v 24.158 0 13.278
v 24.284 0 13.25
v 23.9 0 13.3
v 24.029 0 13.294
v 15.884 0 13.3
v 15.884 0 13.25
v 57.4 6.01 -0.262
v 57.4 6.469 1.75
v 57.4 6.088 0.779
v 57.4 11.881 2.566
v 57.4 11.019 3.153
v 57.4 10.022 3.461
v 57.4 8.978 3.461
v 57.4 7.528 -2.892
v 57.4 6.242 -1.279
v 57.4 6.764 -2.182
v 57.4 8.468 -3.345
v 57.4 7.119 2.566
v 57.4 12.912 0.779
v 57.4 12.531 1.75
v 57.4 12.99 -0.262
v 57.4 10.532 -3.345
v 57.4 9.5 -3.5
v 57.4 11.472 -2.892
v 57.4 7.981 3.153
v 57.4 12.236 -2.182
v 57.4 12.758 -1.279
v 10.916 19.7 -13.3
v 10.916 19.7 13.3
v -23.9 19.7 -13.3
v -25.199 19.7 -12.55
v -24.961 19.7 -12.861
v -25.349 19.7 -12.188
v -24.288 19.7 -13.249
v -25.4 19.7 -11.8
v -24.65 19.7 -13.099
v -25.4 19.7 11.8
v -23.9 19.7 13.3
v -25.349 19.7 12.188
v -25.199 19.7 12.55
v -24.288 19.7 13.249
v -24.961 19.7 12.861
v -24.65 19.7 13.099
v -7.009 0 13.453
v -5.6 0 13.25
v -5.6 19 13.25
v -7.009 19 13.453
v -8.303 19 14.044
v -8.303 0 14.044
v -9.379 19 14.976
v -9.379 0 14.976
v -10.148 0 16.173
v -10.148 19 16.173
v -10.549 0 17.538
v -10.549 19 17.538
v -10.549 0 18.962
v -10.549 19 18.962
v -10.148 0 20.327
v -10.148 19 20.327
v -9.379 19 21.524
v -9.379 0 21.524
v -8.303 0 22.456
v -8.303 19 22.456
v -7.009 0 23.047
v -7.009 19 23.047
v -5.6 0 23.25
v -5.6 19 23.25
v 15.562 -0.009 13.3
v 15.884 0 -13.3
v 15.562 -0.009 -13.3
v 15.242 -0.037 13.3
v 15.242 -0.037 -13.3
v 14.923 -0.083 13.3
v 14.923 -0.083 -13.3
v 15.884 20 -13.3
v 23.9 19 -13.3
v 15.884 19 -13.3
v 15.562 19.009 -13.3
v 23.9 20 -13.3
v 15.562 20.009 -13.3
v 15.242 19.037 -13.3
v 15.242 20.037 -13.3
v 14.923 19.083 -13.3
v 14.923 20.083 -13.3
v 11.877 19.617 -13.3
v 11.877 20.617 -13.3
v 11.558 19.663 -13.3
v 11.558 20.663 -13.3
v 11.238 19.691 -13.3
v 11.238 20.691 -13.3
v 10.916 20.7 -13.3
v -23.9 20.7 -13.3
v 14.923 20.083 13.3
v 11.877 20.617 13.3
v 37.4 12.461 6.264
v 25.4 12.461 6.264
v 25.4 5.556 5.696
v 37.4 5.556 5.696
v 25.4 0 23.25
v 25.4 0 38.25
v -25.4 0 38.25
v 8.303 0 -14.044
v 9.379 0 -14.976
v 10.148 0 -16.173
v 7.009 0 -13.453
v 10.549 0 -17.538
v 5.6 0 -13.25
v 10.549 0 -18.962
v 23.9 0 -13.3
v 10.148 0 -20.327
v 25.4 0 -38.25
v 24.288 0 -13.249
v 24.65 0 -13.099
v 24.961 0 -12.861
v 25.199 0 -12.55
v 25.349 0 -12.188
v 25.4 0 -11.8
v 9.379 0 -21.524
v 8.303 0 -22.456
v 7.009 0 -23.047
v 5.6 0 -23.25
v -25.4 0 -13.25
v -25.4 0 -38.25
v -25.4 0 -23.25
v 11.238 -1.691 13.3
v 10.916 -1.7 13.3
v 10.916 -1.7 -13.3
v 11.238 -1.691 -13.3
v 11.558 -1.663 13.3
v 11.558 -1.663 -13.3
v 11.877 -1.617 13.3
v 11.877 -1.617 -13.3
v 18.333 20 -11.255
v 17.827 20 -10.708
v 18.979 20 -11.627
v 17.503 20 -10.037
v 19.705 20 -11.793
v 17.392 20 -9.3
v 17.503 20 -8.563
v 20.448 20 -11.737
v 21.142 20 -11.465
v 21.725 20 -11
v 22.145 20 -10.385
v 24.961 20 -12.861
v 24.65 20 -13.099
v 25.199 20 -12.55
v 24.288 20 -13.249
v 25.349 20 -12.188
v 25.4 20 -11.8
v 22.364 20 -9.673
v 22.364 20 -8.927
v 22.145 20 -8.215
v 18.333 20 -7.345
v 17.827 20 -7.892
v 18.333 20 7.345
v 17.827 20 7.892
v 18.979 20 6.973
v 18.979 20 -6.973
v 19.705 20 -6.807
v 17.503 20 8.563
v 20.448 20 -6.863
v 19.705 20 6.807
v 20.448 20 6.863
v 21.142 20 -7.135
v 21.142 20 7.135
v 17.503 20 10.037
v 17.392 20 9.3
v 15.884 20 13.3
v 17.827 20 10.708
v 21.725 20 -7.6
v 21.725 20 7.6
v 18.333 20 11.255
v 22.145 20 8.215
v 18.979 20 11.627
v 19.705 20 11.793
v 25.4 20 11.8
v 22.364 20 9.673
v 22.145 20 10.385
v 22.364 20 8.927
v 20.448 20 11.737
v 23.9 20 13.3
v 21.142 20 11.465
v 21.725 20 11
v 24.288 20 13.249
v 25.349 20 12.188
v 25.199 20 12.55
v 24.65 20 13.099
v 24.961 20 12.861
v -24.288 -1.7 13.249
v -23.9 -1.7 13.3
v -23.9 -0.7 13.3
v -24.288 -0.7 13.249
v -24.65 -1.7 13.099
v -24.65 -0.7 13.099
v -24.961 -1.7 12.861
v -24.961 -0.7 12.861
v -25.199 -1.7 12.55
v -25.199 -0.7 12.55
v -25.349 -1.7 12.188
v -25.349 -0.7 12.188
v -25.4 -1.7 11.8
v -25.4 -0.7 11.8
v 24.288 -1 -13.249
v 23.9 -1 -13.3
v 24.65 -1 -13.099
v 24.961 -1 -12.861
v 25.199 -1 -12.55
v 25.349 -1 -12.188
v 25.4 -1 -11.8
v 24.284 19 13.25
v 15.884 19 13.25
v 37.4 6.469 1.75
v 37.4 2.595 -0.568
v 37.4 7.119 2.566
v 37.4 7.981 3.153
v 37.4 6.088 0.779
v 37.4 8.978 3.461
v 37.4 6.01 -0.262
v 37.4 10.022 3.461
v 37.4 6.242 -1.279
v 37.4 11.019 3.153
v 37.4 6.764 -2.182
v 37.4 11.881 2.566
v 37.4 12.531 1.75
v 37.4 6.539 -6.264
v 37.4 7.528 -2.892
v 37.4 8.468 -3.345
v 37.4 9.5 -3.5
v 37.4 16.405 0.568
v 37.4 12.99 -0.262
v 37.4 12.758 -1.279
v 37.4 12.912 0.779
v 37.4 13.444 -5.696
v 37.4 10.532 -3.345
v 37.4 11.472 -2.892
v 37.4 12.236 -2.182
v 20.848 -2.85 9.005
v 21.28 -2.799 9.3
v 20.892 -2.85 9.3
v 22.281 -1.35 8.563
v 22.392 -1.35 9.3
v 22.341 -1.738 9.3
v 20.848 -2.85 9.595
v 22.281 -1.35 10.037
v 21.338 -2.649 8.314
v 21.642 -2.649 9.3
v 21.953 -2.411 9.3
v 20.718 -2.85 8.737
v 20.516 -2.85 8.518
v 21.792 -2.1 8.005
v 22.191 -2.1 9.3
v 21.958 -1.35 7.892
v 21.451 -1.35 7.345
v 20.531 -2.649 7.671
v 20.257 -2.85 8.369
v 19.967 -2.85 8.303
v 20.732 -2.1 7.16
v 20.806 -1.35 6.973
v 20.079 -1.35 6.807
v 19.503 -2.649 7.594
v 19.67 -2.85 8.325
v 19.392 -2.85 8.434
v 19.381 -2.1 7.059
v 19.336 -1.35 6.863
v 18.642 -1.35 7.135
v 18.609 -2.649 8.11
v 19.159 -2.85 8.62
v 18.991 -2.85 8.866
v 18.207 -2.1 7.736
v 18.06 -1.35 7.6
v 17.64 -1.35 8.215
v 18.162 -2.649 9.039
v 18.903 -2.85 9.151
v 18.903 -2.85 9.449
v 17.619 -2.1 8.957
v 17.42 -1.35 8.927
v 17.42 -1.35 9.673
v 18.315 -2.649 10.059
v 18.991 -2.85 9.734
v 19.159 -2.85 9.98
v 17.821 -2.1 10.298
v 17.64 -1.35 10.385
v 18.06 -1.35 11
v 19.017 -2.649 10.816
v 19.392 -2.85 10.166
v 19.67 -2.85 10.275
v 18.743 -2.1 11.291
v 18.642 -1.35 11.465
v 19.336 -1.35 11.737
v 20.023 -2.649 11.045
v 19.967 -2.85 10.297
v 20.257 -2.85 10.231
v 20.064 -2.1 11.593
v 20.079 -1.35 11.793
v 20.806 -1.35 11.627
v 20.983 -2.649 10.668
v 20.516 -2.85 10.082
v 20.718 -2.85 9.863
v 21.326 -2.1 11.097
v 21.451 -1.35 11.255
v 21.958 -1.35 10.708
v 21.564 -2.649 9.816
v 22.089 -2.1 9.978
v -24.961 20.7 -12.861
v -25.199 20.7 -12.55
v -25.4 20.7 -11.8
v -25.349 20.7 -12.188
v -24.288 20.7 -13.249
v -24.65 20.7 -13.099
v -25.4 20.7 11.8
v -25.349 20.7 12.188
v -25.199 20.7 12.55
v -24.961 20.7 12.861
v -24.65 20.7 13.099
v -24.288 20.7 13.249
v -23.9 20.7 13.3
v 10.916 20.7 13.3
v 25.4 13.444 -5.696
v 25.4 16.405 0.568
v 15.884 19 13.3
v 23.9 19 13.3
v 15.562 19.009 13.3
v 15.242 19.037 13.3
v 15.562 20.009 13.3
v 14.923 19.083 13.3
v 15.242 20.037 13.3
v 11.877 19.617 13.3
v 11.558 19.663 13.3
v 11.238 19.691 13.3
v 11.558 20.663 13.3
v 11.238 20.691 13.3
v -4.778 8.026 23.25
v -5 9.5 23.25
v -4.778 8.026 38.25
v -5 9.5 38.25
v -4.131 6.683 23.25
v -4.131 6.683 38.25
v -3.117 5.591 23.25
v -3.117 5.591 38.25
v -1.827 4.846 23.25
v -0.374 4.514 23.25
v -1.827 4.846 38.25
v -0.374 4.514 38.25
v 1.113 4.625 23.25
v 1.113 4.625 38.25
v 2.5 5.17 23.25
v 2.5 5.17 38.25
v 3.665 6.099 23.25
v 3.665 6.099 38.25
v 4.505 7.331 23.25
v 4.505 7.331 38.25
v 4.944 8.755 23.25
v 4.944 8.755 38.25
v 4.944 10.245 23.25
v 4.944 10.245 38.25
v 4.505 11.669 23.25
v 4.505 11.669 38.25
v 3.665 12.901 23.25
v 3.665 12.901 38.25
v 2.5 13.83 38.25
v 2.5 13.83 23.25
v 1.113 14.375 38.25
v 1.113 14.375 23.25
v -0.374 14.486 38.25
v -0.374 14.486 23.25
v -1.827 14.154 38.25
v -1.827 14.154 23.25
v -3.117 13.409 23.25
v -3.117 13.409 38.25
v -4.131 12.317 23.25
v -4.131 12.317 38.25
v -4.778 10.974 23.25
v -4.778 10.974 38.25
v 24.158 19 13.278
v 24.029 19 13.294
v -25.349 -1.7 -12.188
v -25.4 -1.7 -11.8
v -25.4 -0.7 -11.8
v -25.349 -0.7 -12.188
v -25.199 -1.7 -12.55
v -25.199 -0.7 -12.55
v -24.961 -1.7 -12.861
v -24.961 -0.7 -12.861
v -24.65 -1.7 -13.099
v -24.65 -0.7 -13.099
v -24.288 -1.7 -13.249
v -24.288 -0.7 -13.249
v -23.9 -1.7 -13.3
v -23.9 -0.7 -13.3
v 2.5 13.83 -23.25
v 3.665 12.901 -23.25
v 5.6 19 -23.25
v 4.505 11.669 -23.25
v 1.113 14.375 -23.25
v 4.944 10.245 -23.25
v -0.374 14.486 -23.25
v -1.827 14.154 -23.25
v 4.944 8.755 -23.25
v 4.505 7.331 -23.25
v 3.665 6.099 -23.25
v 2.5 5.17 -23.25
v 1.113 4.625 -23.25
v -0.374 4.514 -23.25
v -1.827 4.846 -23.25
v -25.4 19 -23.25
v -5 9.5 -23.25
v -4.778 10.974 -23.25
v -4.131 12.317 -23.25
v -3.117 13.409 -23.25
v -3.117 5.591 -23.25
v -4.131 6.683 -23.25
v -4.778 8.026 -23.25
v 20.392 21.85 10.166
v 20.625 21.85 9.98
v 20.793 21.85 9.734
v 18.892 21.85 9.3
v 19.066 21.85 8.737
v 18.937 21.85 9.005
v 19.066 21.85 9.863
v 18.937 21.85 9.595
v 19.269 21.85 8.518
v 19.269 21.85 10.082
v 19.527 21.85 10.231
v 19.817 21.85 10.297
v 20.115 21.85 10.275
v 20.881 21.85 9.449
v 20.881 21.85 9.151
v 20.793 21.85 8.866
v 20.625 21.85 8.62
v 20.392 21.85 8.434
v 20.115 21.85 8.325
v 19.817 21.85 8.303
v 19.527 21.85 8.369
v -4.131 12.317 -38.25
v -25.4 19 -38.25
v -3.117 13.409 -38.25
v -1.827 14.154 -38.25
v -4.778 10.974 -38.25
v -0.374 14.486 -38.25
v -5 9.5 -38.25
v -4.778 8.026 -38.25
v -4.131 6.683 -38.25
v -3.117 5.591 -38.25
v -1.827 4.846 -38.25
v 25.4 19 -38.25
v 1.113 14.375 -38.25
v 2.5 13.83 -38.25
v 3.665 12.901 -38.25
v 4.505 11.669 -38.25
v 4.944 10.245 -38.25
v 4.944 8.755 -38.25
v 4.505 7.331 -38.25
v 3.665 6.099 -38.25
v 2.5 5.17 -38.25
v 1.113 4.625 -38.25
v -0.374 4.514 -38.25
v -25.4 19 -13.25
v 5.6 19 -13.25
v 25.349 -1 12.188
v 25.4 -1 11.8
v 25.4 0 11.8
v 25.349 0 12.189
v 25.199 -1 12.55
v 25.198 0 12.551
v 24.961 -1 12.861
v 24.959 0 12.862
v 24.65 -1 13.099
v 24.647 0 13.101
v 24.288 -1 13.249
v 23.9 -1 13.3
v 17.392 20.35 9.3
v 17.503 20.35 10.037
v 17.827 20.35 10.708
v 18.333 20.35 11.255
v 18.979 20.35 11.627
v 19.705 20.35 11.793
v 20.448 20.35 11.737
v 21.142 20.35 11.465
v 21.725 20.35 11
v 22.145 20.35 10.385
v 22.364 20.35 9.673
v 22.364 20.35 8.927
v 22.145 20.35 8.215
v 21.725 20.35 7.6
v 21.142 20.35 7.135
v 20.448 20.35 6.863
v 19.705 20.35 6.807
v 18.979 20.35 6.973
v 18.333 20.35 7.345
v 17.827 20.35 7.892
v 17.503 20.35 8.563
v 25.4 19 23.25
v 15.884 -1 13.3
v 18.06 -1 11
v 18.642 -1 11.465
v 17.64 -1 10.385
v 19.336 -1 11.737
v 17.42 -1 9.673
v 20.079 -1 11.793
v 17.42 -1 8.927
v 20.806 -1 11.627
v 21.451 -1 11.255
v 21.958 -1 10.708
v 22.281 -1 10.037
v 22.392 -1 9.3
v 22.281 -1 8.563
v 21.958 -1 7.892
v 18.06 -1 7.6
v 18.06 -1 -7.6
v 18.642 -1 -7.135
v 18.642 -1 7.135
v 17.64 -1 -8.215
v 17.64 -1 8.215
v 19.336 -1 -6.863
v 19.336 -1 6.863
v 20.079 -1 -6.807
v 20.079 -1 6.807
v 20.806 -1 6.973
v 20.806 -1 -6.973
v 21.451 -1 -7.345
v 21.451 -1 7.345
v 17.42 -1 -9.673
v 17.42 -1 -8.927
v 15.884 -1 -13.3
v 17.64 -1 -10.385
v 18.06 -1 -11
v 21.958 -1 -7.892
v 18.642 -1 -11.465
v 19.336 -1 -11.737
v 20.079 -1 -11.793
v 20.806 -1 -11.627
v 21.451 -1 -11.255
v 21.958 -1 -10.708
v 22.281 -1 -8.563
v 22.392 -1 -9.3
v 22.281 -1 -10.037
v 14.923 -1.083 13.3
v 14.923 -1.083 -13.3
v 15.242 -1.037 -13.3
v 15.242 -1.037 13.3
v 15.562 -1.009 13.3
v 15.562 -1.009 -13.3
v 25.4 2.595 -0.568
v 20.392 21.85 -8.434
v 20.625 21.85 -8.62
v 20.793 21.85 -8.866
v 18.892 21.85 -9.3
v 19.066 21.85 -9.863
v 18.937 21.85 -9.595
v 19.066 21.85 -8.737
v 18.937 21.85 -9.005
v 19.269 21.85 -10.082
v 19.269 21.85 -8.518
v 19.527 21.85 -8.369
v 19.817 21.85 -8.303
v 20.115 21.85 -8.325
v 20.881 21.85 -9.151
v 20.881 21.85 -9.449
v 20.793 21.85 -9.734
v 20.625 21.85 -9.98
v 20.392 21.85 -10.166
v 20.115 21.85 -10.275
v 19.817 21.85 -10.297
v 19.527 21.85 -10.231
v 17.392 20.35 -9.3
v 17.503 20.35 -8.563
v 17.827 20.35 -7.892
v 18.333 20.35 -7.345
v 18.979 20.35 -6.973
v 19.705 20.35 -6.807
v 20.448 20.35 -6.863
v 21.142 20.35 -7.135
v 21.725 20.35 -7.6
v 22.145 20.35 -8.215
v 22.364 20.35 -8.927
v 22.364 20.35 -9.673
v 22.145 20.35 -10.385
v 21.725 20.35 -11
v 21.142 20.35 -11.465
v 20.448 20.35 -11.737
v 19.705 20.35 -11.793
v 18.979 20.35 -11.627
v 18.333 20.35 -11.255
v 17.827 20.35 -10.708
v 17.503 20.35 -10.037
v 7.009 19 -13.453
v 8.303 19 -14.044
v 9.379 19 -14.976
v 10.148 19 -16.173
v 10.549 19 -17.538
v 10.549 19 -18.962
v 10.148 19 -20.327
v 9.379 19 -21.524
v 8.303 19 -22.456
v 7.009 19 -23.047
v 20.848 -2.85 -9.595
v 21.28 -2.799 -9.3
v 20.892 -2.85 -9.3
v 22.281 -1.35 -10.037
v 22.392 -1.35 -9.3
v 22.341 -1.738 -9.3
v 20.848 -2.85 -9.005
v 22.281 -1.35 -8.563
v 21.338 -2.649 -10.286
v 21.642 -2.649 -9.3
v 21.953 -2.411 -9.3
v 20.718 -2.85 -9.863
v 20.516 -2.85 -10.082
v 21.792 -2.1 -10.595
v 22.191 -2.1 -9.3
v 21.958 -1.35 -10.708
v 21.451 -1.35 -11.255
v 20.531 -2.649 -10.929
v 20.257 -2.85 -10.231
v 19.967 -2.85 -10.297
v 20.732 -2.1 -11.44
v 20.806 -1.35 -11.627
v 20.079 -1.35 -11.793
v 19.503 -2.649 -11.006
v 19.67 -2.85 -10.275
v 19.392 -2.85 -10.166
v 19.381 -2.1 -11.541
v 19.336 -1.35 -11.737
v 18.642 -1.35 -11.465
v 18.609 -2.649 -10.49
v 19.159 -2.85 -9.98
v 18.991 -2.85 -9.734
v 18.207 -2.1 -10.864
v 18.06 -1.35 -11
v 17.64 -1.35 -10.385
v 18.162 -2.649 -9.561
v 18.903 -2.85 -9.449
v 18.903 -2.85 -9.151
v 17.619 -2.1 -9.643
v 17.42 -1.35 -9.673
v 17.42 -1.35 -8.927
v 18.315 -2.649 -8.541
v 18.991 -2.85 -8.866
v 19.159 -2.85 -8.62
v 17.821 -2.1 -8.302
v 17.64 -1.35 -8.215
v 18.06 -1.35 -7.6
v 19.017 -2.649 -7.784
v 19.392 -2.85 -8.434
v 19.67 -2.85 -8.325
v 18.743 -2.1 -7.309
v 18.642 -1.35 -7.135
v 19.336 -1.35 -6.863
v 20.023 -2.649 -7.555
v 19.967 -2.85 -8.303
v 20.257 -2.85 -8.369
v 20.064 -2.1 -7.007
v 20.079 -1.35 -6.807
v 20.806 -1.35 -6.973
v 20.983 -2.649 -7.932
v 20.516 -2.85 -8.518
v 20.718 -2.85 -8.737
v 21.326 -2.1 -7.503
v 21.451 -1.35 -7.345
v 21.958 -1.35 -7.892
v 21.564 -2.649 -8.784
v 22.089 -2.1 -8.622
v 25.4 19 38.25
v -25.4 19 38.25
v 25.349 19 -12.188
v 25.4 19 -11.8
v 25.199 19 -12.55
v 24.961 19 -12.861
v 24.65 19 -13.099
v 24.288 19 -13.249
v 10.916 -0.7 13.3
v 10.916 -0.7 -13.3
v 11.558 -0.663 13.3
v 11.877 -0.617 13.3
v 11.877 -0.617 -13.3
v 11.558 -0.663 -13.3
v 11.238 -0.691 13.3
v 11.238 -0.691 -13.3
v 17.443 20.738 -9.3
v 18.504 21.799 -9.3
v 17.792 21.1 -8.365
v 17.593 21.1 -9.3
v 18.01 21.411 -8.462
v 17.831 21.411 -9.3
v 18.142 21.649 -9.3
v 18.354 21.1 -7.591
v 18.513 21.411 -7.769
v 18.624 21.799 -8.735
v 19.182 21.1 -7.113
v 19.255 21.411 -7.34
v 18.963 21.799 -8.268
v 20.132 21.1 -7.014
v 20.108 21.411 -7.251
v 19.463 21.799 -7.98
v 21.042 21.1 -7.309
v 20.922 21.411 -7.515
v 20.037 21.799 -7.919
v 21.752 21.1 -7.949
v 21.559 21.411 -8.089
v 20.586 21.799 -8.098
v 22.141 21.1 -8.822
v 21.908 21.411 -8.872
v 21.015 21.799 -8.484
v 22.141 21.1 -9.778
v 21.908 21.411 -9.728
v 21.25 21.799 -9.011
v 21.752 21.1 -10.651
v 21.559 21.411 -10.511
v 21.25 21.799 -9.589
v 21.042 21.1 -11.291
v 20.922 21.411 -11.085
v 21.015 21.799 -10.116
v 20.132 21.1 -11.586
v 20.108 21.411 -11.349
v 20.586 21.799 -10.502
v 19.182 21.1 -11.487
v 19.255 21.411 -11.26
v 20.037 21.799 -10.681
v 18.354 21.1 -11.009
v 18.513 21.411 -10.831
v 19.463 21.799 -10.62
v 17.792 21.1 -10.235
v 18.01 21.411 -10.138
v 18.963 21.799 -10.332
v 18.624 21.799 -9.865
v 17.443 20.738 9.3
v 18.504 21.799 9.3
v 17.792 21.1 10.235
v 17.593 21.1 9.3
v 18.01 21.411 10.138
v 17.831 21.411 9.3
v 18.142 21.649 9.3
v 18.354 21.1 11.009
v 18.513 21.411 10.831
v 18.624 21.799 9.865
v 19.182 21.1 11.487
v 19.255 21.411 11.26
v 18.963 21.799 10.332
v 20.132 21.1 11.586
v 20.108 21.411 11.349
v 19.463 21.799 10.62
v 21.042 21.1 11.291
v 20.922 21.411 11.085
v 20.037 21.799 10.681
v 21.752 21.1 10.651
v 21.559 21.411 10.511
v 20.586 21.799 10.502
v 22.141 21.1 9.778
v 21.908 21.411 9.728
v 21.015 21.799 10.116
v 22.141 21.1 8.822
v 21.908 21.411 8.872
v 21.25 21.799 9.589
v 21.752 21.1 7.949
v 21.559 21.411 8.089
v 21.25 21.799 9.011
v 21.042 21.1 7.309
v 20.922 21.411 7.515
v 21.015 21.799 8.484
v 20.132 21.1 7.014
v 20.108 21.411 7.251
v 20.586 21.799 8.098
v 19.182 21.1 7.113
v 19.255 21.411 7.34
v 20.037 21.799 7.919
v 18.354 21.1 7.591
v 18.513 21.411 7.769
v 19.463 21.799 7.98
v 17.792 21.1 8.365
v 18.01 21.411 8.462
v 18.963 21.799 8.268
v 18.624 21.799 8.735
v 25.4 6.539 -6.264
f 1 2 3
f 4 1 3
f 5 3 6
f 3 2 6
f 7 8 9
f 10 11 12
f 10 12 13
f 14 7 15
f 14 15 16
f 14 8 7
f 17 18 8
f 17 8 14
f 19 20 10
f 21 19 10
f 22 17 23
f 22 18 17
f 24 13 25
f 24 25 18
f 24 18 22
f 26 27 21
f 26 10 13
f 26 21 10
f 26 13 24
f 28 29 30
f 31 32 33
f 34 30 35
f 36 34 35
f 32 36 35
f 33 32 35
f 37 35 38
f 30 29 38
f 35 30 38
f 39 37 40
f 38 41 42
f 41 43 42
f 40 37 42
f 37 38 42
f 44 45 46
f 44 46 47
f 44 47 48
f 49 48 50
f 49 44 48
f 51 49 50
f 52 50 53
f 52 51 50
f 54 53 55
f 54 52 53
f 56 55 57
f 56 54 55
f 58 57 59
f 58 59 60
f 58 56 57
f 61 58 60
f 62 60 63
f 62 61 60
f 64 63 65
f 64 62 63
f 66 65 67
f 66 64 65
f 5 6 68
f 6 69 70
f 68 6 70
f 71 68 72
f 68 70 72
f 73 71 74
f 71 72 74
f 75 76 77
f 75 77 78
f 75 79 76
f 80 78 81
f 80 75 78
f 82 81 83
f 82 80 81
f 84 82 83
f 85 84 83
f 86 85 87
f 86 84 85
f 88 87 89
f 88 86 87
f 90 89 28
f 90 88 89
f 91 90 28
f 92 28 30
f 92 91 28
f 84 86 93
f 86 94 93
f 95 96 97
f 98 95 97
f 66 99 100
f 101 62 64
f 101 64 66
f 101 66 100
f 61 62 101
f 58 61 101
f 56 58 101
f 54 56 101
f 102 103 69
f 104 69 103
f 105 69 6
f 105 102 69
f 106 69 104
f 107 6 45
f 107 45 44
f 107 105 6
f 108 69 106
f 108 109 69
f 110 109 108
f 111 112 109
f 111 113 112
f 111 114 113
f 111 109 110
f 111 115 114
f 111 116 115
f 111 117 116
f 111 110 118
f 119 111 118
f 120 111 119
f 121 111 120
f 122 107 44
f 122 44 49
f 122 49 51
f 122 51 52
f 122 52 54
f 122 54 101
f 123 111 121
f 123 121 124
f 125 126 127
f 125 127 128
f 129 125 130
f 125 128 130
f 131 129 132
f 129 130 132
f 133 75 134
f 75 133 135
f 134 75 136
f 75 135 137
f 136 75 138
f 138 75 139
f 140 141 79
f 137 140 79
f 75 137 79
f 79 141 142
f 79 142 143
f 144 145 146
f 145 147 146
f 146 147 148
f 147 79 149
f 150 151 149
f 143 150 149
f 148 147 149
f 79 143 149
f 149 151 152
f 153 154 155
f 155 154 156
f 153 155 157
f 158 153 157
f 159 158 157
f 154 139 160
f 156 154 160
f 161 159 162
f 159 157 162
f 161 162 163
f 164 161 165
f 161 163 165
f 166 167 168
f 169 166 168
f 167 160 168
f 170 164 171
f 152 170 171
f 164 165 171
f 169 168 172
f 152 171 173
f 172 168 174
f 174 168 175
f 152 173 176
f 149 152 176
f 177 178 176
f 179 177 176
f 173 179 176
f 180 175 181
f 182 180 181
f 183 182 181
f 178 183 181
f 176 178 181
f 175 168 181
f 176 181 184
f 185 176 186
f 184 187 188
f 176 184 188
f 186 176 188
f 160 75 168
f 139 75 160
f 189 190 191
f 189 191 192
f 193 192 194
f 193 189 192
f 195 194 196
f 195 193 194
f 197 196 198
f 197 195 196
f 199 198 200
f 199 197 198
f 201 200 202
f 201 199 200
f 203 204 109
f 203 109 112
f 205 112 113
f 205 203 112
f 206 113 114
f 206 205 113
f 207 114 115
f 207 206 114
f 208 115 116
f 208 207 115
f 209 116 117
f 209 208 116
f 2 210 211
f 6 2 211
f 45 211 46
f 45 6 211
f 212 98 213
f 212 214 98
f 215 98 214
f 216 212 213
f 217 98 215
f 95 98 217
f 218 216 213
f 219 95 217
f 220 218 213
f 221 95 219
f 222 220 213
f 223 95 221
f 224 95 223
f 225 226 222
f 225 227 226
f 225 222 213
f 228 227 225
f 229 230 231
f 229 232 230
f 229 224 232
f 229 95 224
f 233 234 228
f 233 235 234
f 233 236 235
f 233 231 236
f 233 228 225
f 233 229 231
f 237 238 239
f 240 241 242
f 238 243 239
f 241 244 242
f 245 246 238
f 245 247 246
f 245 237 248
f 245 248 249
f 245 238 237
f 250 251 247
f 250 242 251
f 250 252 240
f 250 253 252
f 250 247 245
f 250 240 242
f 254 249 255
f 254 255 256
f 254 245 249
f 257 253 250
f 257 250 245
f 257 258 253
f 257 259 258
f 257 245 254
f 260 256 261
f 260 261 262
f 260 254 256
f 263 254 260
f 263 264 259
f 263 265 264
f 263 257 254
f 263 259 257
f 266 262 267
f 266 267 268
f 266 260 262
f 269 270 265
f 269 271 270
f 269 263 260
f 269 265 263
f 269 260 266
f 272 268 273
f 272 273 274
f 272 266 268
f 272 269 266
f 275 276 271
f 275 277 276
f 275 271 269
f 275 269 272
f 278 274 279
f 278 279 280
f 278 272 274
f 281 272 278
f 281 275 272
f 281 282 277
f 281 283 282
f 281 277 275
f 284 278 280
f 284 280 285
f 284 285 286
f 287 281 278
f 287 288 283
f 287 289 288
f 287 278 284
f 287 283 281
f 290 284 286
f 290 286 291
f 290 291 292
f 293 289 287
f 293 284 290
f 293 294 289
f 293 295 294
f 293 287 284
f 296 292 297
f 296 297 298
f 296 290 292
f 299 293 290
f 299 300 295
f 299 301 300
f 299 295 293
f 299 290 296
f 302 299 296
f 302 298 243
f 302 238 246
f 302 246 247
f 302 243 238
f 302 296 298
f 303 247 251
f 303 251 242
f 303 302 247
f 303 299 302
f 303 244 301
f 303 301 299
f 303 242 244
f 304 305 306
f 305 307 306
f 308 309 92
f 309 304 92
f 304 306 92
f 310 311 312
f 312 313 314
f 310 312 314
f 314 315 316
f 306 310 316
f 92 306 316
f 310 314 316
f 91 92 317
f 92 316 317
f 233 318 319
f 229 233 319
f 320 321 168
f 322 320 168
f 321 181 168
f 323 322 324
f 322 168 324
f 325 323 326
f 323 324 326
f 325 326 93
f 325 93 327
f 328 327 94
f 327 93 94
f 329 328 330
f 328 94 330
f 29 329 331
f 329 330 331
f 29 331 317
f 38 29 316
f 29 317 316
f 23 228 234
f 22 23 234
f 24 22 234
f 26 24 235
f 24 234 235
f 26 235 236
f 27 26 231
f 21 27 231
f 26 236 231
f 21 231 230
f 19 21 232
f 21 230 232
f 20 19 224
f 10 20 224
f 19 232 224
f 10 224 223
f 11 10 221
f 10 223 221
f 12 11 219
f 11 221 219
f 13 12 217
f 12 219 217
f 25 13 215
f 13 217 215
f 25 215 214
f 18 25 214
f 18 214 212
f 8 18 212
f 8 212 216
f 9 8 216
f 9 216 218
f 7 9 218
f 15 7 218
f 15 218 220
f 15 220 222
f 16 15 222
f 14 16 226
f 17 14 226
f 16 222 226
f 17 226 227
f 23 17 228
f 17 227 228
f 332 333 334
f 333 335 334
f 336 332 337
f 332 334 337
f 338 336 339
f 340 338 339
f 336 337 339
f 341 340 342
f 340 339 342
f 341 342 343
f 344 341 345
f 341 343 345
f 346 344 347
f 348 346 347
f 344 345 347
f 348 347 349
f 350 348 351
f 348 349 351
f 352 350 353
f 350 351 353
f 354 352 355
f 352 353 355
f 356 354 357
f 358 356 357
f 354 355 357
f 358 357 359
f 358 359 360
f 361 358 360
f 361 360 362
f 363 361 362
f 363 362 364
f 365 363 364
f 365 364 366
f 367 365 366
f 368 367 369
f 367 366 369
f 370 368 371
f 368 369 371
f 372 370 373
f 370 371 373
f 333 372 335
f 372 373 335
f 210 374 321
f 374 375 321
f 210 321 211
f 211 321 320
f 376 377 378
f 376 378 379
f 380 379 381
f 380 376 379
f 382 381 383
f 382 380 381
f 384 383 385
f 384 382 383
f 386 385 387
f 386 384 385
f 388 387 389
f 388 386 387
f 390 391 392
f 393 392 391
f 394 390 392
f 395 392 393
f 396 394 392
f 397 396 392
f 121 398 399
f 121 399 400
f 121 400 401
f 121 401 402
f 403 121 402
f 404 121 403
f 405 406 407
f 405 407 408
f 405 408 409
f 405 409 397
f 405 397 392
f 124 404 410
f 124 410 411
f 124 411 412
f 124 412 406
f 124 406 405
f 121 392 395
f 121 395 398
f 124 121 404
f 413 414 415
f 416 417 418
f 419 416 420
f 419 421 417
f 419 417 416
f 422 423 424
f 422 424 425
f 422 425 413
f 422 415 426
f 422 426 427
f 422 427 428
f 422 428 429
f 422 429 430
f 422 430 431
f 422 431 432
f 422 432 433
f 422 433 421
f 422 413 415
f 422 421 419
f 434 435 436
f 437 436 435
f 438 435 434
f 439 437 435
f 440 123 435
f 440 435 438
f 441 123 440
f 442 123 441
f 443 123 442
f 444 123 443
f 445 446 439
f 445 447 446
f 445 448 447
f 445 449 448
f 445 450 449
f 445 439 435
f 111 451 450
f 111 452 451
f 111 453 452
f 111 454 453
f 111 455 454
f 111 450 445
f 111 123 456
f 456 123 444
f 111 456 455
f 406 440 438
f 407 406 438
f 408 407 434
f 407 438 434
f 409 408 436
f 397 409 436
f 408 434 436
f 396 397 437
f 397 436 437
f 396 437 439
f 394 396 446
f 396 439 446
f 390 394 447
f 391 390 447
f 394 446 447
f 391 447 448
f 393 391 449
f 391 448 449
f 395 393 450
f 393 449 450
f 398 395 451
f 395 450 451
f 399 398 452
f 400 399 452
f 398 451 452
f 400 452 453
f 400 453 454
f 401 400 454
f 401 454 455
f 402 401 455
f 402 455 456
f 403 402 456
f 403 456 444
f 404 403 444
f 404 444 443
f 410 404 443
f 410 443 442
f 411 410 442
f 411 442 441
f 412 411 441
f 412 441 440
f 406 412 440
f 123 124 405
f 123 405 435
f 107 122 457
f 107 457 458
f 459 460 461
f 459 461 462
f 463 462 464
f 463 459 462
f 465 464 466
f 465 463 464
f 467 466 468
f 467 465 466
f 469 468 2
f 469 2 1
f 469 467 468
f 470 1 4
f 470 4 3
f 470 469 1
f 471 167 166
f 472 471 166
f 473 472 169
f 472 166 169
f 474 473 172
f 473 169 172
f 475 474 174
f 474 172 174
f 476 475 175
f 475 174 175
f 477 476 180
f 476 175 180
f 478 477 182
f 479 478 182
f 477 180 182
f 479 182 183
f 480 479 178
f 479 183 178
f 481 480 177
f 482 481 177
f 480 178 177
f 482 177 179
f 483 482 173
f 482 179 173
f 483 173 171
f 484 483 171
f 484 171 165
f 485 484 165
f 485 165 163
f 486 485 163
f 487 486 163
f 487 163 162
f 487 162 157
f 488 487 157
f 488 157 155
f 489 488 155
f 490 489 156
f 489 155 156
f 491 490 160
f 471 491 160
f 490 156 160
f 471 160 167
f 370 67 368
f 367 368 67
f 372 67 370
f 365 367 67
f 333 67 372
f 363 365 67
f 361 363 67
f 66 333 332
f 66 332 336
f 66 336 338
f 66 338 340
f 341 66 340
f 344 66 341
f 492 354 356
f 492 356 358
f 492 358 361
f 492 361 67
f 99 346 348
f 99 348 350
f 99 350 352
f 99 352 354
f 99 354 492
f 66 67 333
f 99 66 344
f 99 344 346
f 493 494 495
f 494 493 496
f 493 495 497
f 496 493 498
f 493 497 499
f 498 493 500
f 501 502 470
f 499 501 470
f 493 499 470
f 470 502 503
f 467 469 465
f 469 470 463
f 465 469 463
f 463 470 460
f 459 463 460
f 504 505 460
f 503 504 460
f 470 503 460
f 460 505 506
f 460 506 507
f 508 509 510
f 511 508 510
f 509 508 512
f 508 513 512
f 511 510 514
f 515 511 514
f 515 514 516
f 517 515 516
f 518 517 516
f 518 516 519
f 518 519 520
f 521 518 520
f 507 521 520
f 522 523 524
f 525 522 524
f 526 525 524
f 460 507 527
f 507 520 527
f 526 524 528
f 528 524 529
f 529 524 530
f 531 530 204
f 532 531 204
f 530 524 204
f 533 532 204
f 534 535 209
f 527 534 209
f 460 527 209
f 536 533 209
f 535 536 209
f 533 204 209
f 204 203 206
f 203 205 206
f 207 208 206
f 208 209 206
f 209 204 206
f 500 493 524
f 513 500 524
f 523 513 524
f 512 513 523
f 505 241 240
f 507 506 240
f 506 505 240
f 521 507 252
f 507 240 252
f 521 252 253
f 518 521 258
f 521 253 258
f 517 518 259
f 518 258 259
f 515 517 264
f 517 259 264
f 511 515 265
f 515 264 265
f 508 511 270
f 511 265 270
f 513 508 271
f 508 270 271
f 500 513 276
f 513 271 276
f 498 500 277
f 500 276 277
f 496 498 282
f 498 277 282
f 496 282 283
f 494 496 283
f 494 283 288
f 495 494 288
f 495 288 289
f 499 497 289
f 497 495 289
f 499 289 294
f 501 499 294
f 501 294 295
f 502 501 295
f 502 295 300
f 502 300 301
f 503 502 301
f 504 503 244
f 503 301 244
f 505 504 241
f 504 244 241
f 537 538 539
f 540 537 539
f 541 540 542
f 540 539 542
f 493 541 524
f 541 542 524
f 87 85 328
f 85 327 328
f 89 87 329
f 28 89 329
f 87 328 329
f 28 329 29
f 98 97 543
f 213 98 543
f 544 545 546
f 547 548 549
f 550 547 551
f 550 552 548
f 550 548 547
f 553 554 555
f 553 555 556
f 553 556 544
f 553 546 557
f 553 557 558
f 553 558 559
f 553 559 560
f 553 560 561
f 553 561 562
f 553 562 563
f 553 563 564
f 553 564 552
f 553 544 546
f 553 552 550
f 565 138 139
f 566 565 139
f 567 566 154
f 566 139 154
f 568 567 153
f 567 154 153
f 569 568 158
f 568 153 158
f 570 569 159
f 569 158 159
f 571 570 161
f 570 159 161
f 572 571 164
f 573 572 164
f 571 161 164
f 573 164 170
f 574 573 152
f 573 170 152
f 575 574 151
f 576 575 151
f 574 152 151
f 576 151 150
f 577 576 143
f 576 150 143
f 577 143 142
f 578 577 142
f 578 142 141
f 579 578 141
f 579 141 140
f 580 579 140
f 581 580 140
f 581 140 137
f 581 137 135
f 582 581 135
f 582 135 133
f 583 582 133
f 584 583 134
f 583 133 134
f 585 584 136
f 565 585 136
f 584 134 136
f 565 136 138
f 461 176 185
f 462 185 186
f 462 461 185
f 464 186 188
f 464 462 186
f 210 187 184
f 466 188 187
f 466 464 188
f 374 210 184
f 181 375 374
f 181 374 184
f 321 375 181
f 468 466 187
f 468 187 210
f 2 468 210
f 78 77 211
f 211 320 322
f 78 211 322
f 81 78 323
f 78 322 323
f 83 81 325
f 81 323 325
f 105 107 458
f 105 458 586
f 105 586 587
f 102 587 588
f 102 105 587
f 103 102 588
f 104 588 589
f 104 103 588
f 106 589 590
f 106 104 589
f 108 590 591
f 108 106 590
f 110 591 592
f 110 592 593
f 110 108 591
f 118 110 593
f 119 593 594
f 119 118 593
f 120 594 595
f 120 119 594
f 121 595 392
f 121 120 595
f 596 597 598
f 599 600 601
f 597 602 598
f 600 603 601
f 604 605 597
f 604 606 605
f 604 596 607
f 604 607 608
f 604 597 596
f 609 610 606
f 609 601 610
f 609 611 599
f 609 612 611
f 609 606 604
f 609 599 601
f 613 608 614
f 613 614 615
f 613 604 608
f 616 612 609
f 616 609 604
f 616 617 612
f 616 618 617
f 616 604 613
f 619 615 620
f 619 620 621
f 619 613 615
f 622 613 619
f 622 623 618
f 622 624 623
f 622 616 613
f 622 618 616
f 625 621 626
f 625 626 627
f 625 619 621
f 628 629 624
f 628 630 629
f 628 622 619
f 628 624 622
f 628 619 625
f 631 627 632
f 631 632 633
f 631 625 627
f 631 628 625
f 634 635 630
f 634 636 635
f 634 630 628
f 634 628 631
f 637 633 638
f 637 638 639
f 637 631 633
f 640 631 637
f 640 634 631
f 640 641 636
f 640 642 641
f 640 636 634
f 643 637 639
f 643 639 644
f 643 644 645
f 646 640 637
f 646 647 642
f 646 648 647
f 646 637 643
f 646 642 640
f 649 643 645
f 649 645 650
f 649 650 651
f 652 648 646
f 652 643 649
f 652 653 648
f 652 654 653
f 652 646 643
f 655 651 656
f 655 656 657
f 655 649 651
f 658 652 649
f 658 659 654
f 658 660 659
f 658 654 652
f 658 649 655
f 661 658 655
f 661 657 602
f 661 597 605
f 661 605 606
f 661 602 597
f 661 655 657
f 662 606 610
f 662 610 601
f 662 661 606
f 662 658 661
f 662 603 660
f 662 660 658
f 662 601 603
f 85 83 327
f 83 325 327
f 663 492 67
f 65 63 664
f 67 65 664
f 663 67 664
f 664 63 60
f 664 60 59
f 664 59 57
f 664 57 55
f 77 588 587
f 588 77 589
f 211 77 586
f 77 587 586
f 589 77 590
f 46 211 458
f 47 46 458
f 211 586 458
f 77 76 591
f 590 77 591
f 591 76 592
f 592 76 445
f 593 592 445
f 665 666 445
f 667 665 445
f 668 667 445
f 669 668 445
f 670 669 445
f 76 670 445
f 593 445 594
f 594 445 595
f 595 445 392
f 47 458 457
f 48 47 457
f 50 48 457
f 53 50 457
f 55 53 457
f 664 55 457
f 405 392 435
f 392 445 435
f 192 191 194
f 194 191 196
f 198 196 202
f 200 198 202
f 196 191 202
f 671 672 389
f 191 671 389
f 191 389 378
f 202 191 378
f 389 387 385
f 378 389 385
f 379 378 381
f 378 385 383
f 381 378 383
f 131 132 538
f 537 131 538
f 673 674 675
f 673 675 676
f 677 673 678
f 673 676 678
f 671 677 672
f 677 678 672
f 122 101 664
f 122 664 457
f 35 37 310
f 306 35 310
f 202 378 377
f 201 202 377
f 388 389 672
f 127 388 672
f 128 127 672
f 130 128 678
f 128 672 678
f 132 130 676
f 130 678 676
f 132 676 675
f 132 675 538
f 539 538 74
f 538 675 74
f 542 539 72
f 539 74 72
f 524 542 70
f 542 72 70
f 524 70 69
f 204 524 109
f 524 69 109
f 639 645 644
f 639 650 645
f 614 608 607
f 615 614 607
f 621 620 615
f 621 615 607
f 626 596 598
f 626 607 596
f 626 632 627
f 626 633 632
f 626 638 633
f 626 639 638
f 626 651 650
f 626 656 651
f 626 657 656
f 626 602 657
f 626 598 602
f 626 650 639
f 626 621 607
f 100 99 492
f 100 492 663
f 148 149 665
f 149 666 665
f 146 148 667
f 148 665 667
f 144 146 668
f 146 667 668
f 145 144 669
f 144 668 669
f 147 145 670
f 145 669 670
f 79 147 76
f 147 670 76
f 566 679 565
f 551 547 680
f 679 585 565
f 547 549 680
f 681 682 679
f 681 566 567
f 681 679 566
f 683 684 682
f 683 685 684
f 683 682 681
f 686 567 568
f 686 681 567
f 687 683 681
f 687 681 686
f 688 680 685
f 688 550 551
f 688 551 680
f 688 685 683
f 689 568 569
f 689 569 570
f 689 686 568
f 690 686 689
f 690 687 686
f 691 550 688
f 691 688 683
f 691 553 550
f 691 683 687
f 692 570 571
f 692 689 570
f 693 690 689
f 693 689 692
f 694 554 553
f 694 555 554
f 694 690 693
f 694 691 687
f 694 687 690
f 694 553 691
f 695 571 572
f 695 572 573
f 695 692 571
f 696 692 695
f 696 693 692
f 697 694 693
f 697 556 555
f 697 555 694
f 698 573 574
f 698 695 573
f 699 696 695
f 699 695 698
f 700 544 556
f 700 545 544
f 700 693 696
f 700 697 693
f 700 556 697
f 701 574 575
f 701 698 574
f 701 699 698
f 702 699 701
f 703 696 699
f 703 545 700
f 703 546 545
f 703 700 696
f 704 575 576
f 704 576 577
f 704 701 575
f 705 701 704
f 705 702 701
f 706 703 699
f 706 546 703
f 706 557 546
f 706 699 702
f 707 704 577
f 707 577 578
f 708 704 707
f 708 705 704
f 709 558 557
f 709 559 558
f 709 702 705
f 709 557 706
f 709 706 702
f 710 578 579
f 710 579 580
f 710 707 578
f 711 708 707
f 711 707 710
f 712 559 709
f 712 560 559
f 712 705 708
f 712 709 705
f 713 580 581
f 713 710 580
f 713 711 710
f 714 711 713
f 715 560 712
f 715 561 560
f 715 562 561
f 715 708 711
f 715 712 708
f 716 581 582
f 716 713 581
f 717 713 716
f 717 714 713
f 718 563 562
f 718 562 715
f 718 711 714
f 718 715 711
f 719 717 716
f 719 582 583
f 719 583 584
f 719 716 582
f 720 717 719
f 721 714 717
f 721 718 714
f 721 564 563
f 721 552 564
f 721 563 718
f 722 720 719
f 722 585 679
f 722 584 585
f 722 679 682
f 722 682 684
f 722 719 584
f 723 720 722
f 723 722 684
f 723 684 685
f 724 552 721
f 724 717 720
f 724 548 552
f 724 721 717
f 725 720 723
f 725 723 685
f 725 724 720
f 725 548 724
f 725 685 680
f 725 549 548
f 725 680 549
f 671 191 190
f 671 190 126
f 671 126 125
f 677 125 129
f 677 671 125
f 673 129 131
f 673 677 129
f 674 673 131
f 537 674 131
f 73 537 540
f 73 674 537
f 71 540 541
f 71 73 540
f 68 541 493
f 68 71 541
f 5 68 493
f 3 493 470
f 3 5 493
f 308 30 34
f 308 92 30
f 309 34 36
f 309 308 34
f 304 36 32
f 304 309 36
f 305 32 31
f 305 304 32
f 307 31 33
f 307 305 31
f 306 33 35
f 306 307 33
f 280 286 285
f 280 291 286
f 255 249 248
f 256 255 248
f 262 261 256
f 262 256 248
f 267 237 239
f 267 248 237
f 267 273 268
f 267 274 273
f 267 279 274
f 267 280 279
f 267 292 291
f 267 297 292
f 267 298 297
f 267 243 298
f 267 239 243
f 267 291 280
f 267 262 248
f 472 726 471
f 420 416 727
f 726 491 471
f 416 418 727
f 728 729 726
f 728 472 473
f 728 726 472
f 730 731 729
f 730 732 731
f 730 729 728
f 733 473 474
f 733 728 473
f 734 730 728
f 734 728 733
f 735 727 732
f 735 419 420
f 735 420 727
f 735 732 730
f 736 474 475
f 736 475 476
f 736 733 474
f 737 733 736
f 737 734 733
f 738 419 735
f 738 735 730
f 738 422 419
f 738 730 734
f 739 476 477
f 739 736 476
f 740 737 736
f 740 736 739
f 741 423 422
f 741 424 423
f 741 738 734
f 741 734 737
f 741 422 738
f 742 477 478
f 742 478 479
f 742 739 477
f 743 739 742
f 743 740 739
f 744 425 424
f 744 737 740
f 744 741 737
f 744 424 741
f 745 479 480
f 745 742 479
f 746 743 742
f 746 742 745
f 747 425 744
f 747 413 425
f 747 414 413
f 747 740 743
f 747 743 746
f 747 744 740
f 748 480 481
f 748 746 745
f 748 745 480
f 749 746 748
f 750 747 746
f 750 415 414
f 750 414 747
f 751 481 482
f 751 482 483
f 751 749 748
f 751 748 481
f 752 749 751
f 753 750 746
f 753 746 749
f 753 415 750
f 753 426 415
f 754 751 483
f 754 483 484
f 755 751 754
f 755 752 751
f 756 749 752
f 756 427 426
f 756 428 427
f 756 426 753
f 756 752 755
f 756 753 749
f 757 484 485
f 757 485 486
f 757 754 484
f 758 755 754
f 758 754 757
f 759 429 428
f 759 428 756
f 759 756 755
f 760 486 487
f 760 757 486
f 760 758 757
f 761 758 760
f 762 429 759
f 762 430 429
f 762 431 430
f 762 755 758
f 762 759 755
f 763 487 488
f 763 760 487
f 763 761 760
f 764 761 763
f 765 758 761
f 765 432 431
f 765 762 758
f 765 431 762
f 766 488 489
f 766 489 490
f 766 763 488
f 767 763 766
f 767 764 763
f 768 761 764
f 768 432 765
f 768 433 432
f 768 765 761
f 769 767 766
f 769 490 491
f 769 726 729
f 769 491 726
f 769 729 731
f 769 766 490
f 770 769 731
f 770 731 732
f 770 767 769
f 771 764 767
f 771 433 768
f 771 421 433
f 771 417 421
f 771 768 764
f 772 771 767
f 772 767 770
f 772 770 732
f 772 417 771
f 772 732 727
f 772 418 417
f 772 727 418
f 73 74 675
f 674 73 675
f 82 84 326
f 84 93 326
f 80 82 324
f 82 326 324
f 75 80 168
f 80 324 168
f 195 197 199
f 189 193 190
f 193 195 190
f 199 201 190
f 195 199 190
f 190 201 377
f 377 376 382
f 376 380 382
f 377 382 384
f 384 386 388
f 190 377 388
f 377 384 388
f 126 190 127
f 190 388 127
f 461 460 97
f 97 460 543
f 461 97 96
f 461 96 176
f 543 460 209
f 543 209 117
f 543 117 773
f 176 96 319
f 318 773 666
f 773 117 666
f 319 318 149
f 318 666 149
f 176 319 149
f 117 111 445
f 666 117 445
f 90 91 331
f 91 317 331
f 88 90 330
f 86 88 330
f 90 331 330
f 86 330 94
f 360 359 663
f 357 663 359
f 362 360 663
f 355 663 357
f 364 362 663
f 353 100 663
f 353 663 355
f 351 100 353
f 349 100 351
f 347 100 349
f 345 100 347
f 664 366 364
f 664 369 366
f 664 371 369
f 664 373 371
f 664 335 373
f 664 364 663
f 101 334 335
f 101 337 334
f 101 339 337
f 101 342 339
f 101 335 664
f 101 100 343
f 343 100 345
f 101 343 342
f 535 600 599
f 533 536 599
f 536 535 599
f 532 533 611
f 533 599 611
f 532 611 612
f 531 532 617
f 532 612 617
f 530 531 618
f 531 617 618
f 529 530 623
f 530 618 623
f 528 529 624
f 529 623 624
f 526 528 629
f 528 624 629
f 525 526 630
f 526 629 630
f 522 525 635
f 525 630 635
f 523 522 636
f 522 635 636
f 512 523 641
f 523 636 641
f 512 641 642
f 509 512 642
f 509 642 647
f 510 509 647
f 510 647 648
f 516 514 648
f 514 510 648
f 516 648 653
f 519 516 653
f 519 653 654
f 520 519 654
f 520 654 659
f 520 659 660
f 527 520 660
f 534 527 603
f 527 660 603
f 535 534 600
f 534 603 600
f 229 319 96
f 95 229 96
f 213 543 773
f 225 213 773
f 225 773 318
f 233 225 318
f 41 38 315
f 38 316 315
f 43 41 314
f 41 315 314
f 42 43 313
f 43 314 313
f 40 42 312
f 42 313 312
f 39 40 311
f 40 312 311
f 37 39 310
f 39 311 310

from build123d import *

# Parameters (mm, degrees)
SALIENTE_EXTRUIR1_DEPTH = 19
CORTAR_EXTRUIR1_REACH   = 84.816
CROQUIS2_R              = 5
CORTAR_EXTRUIR2_REACH   = 84.816
CROQUIS3_R              = 5
SALIENTE_EXTRUIR2_DEPTH = 12
CROQUIS5_R              = 3.5
SALIENTE_EXTRUIR3_DEPTH = 20
SALIENTE_EXTRUIR4_DEPTH = 13.3
REDONDEO1_R             = 1.5
CROQUIS8_R              = 2.5
SALIENTE_EXTRUIR5_DEPTH = 1.85
REDONDEO2_R             = 1.5
SIMETR_A1_START         = -1.3500001
SIMETR_A1_OUTLINE_R     = 2.5
SIMETR_A1_DEPTH         = 1.3500001
SIMETR_A1_START_2       = -13.3
SIMETR_A1_2_DEPTH       = 26.6
SIMETR_A1_START_3       = -3
SIMETR_A1_5_DEPTH       = 3


with BuildPart() as part:
    # Croquis1 → Saliente-Extruir1 (new body)
    with BuildSketch(Plane(origin=(0, 0, 0), x_dir=(1, 0, 0), z_dir=(0, 1, 0))):
        with BuildLine():
            Line((-25.4, 23.25), (-25.4, 38.25))
            Line((-25.4, 38.25), (25.4, 38.25))
            Line((25.4, 38.25), (25.4, -13.25))
            Line((25.4, -13.25), (-5.6, -13.25))
            ThreePointArc((-5.6, -13.25), (-10.6, -18.25), (-5.6, -23.25))
            Line((-5.6, -23.25), (25.4, -23.25))
            Line((25.4, -23.25), (25.4, -38.25))
            Line((25.4, -38.25), (-25.4, -38.25))
            Line((-25.4, -38.25), (-25.4, 13.25))
            Line((-25.4, 13.25), (5.6, 13.25))
            ThreePointArc((5.6, 13.25), (10.6, 18.25), (5.6, 23.25))
            Line((5.6, 23.25), (-25.4, 23.25))
        make_face()
    extrude(amount=SALIENTE_EXTRUIR1_DEPTH)

    # Croquis2 → Cortar-Extruir1 (cut, up to next)
    with BuildSketch(Plane(origin=(0, 0, -38.25), x_dir=(-1, 0, 0), z_dir=(0, 0, -1)), mode=Mode.PRIVATE) as cortar_extruir1_sk1:
        with Locations((0, 9.5)):
            Circle(CROQUIS2_R)
    cortar_extruir1_tool1 = extrude(cortar_extruir1_sk1.sketch, amount=-CORTAR_EXTRUIR1_REACH, mode=Mode.PRIVATE) & part.part
    add(cortar_extruir1_tool1.solids().sort_by_distance((0, 9.5, -38.25))[0], mode=Mode.SUBTRACT)

    # Croquis3 → Cortar-Extruir2 (cut, up to next)
    with BuildSketch(Plane.XY.offset(38.25), mode=Mode.PRIVATE) as cortar_extruir2_sk1:
        with Locations(Location((0, 9.5, 0), (0, 0, 180))):
            Circle(CROQUIS3_R)
    cortar_extruir2_tool1 = extrude(cortar_extruir2_sk1.sketch, amount=-CORTAR_EXTRUIR2_REACH, mode=Mode.PRIVATE) & part.part
    add(cortar_extruir2_tool1.solids().sort_by_distance((0, 9.5, 38.25))[0], mode=Mode.SUBTRACT)

    # Croquis4 → Saliente-Extruir2 (add)
    with BuildSketch(Plane(origin=(25.4, 0, 0), x_dir=(0, 0, -1), z_dir=(1, 0, 0))):
        Polygon((0.567837029, 2.595106003), (6.263732126, 6.539314294), (5.695895097, 13.444208291), (-0.567837029, 16.404893997), (-6.263732126, 12.460685706), (-5.695895097, 5.555791709), align=None)
    extrude(amount=SALIENTE_EXTRUIR2_DEPTH)

    # Croquis5 → Saliente-Extruir3 (add)
    with BuildSketch(Plane(origin=(37.4, 0, 0), x_dir=(0, 0, -1), z_dir=(1, 0, 0))):
        with Locations((0, 9.5)):
            Circle(CROQUIS5_R)
    extrude(amount=SALIENTE_EXTRUIR3_DEPTH)

    # Croquis6 → Saliente-Extruir4 (add, symmetric)
    with BuildSketch(Plane.XY):
        with BuildLine():
            Line((25.4, 19), (15.884301947, 19))
            ThreePointArc((15.884301947, 19), (15.401815848, 19.020910233), (14.922947827, 19.08348413))
            Line((14.922947827, 19.08348413), (11.877052173, 19.61651587))
            ThreePointArc((11.877052173, 19.61651587), (11.398184152, 19.679089767), (10.915698053, 19.7))
            Line((10.915698053, 19.7), (-25.4, 19.7))
            Line((-25.4, 19.7), (-25.4, 20.7))
            Line((-25.4, 20.7), (10.915698053, 20.7))
            ThreePointArc((10.915698053, 20.7), (11.398184152, 20.679089767), (11.877052173, 20.61651587))
            Line((11.877052173, 20.61651587), (14.922947827, 20.08348413))
            ThreePointArc((14.922947827, 20.08348413), (15.401815848, 20.020910233), (15.884301947, 20))
            Line((15.884301947, 20), (25.4, 20))
            Line((25.4, 20), (25.4, 19))
        make_face()
    extrude(amount=SALIENTE_EXTRUIR4_DEPTH, both=True)

    # Redondeo1
    redondeo1_edges = [part.edges().sort_by_distance(p)[0] for p in [
        (-25.4, 20.2, -13.3),
        (-25.4, 20.2, 13.3),
        (25.4, 19.5, 13.3),
        (25.4, 19.5, -13.3),
    ]]
    fillet(redondeo1_edges, radius=REDONDEO1_R)

    # Croquis8 → Saliente-Extruir5 (add)
    with BuildSketch(Plane(origin=(0, 20, 0), x_dir=(1, 0, 0), z_dir=(0, 1, 0))):
        with Locations(Location((19.892150974, 9.3, 0), (0, 0, 180))):
            Circle(CROQUIS8_R)
        with Locations(Location((19.892150974, -9.3, 0), (0, 0, 180))):
            Circle(CROQUIS8_R)
    extrude(amount=SALIENTE_EXTRUIR5_DEPTH)

    # Redondeo2
    redondeo2_edges = [part.edges().sort_by_distance(p)[0] for p in [
        (22.392150974, 21.85, -9.3),
        (22.392150974, 21.85, 9.3),
    ]]
    fillet(redondeo2_edges, radius=REDONDEO2_R)

    # Simetría1: read off the stored shape, not the designer's step
    # Simetría1 outline → Simetría1 (add)
    with BuildSketch(Plane(origin=(0, 0, 0), x_dir=(1, 0, 0), z_dir=(0, 1, 0)).offset(SIMETR_A1_START)):
        with Locations((19.892150974, 9.3)):
            Circle(SIMETR_A1_OUTLINE_R)
        with Locations((19.892150974, -9.3)):
            Circle(SIMETR_A1_OUTLINE_R)
    extrude(amount=SIMETR_A1_DEPTH)

    # Simetr_a1 2 outline → Simetr_a1 2 (add)
    with BuildSketch(Plane.XY.offset(SIMETR_A1_START_2)):
        with BuildLine():
            Line((-25.4, -0.7), (-25.4, -1.7))
            Line((-25.4, -1.7), (10.915698053, -1.7))
            ThreePointArc((10.915698053, -1.7), (11.398184152, -1.679089767), (11.877052173, -1.61651587))
            Line((11.877052173, -1.61651587), (14.922947827, -1.08348413))
            ThreePointArc((14.922947827, -1.08348413), (15.401815848, -1.020910233), (15.884301947, -1))
            Line((15.884301947, -1), (25.4, -1))
            Line((25.4, -1), (25.4, 0))
            Line((25.4, 0), (15.884301947, 0))
            ThreePointArc((15.884301947, 0), (15.401815848, -0.020910233), (14.922947827, -0.08348413))
            Line((14.922947827, -0.08348413), (11.877052173, -0.61651587))
            ThreePointArc((11.877052173, -0.61651587), (11.398184152, -0.679089767), (10.915698053, -0.7))
            Line((10.915698053, -0.7), (-25.4, -0.7))
        make_face()
    extrude(amount=SIMETR_A1_2_DEPTH)

    # Simetr_a1 3 outline → Simetr_a1 3 (revolve)
    with BuildSketch(Plane(origin=(19.892150974, 0, -9.3), x_dir=(1, 0, 0), z_dir=(0, 0, 1))):
        with BuildLine():
            Line((0, -1.35), (0, -2.85))
            Line((0, -2.85), (1, -2.85))
            ThreePointArc((1, -2.85), (2.060660172, -2.410660172), (2.5, -1.35))
            Line((2.5, -1.35), (0, -1.35))
        make_face()
    revolve(axis=Axis((19.892150974, 0, -9.3), (0, 1, 0)))

    # Simetr_a1 4 outline → Simetr_a1 4 (revolve)
    with BuildSketch(Plane(origin=(19.892150974, 0, 9.3), x_dir=(1, 0, 0), z_dir=(0, 0, 1))):
        with BuildLine():
            Line((0, -1.35), (0, -2.85))
            Line((0, -2.85), (1, -2.85))
            ThreePointArc((1, -2.85), (2.060660172, -2.410660172), (2.5, -1.35))
            Line((2.5, -1.35), (0, -1.35))
        make_face()
    revolve(axis=Axis((19.892150974, 0, 9.3), (0, 1, 0)))

    # Simetr_a1 5 outline → Simetr_a1 5 (cut)
    with BuildSketch(Plane(origin=(0, 0, 0), x_dir=(1, 0, 0), z_dir=(0, 1, 0)).offset(SIMETR_A1_START_3)):
        with BuildLine():
            ThreePointArc((-25.4, 11.8), (-24.960660172, 12.860660172), (-23.9, 13.3))
            Line((-23.9, 13.3), (-25.4, 13.3))
            Line((-25.4, 13.3), (-25.4, 11.8))
        make_face()
        with BuildLine():
            Line((25.4, 13.3), (23.9, 13.3))
            ThreePointArc((23.9, 13.3), (24.960660172, 12.860660172), (25.4, 11.8))
            Line((25.4, 11.8), (25.4, 13.3))
        make_face()
        with BuildLine():
            ThreePointArc((-23.9, -13.3), (-24.960660172, -12.860660172), (-25.4, -11.8))
            Line((-25.4, -11.8), (-25.4, -13.3))
            Line((-25.4, -13.3), (-23.9, -13.3))
        make_face()
        with BuildLine():
            Line((25.4, -13.3), (25.4, -11.8))
            ThreePointArc((25.4, -11.8), (24.960660172, -12.860660172), (23.9, -13.3))
            Line((23.9, -13.3), (25.4, -13.3))
        make_face()
    extrude(amount=SIMETR_A1_5_DEPTH, mode=Mode.SUBTRACT)


solid = part.part
